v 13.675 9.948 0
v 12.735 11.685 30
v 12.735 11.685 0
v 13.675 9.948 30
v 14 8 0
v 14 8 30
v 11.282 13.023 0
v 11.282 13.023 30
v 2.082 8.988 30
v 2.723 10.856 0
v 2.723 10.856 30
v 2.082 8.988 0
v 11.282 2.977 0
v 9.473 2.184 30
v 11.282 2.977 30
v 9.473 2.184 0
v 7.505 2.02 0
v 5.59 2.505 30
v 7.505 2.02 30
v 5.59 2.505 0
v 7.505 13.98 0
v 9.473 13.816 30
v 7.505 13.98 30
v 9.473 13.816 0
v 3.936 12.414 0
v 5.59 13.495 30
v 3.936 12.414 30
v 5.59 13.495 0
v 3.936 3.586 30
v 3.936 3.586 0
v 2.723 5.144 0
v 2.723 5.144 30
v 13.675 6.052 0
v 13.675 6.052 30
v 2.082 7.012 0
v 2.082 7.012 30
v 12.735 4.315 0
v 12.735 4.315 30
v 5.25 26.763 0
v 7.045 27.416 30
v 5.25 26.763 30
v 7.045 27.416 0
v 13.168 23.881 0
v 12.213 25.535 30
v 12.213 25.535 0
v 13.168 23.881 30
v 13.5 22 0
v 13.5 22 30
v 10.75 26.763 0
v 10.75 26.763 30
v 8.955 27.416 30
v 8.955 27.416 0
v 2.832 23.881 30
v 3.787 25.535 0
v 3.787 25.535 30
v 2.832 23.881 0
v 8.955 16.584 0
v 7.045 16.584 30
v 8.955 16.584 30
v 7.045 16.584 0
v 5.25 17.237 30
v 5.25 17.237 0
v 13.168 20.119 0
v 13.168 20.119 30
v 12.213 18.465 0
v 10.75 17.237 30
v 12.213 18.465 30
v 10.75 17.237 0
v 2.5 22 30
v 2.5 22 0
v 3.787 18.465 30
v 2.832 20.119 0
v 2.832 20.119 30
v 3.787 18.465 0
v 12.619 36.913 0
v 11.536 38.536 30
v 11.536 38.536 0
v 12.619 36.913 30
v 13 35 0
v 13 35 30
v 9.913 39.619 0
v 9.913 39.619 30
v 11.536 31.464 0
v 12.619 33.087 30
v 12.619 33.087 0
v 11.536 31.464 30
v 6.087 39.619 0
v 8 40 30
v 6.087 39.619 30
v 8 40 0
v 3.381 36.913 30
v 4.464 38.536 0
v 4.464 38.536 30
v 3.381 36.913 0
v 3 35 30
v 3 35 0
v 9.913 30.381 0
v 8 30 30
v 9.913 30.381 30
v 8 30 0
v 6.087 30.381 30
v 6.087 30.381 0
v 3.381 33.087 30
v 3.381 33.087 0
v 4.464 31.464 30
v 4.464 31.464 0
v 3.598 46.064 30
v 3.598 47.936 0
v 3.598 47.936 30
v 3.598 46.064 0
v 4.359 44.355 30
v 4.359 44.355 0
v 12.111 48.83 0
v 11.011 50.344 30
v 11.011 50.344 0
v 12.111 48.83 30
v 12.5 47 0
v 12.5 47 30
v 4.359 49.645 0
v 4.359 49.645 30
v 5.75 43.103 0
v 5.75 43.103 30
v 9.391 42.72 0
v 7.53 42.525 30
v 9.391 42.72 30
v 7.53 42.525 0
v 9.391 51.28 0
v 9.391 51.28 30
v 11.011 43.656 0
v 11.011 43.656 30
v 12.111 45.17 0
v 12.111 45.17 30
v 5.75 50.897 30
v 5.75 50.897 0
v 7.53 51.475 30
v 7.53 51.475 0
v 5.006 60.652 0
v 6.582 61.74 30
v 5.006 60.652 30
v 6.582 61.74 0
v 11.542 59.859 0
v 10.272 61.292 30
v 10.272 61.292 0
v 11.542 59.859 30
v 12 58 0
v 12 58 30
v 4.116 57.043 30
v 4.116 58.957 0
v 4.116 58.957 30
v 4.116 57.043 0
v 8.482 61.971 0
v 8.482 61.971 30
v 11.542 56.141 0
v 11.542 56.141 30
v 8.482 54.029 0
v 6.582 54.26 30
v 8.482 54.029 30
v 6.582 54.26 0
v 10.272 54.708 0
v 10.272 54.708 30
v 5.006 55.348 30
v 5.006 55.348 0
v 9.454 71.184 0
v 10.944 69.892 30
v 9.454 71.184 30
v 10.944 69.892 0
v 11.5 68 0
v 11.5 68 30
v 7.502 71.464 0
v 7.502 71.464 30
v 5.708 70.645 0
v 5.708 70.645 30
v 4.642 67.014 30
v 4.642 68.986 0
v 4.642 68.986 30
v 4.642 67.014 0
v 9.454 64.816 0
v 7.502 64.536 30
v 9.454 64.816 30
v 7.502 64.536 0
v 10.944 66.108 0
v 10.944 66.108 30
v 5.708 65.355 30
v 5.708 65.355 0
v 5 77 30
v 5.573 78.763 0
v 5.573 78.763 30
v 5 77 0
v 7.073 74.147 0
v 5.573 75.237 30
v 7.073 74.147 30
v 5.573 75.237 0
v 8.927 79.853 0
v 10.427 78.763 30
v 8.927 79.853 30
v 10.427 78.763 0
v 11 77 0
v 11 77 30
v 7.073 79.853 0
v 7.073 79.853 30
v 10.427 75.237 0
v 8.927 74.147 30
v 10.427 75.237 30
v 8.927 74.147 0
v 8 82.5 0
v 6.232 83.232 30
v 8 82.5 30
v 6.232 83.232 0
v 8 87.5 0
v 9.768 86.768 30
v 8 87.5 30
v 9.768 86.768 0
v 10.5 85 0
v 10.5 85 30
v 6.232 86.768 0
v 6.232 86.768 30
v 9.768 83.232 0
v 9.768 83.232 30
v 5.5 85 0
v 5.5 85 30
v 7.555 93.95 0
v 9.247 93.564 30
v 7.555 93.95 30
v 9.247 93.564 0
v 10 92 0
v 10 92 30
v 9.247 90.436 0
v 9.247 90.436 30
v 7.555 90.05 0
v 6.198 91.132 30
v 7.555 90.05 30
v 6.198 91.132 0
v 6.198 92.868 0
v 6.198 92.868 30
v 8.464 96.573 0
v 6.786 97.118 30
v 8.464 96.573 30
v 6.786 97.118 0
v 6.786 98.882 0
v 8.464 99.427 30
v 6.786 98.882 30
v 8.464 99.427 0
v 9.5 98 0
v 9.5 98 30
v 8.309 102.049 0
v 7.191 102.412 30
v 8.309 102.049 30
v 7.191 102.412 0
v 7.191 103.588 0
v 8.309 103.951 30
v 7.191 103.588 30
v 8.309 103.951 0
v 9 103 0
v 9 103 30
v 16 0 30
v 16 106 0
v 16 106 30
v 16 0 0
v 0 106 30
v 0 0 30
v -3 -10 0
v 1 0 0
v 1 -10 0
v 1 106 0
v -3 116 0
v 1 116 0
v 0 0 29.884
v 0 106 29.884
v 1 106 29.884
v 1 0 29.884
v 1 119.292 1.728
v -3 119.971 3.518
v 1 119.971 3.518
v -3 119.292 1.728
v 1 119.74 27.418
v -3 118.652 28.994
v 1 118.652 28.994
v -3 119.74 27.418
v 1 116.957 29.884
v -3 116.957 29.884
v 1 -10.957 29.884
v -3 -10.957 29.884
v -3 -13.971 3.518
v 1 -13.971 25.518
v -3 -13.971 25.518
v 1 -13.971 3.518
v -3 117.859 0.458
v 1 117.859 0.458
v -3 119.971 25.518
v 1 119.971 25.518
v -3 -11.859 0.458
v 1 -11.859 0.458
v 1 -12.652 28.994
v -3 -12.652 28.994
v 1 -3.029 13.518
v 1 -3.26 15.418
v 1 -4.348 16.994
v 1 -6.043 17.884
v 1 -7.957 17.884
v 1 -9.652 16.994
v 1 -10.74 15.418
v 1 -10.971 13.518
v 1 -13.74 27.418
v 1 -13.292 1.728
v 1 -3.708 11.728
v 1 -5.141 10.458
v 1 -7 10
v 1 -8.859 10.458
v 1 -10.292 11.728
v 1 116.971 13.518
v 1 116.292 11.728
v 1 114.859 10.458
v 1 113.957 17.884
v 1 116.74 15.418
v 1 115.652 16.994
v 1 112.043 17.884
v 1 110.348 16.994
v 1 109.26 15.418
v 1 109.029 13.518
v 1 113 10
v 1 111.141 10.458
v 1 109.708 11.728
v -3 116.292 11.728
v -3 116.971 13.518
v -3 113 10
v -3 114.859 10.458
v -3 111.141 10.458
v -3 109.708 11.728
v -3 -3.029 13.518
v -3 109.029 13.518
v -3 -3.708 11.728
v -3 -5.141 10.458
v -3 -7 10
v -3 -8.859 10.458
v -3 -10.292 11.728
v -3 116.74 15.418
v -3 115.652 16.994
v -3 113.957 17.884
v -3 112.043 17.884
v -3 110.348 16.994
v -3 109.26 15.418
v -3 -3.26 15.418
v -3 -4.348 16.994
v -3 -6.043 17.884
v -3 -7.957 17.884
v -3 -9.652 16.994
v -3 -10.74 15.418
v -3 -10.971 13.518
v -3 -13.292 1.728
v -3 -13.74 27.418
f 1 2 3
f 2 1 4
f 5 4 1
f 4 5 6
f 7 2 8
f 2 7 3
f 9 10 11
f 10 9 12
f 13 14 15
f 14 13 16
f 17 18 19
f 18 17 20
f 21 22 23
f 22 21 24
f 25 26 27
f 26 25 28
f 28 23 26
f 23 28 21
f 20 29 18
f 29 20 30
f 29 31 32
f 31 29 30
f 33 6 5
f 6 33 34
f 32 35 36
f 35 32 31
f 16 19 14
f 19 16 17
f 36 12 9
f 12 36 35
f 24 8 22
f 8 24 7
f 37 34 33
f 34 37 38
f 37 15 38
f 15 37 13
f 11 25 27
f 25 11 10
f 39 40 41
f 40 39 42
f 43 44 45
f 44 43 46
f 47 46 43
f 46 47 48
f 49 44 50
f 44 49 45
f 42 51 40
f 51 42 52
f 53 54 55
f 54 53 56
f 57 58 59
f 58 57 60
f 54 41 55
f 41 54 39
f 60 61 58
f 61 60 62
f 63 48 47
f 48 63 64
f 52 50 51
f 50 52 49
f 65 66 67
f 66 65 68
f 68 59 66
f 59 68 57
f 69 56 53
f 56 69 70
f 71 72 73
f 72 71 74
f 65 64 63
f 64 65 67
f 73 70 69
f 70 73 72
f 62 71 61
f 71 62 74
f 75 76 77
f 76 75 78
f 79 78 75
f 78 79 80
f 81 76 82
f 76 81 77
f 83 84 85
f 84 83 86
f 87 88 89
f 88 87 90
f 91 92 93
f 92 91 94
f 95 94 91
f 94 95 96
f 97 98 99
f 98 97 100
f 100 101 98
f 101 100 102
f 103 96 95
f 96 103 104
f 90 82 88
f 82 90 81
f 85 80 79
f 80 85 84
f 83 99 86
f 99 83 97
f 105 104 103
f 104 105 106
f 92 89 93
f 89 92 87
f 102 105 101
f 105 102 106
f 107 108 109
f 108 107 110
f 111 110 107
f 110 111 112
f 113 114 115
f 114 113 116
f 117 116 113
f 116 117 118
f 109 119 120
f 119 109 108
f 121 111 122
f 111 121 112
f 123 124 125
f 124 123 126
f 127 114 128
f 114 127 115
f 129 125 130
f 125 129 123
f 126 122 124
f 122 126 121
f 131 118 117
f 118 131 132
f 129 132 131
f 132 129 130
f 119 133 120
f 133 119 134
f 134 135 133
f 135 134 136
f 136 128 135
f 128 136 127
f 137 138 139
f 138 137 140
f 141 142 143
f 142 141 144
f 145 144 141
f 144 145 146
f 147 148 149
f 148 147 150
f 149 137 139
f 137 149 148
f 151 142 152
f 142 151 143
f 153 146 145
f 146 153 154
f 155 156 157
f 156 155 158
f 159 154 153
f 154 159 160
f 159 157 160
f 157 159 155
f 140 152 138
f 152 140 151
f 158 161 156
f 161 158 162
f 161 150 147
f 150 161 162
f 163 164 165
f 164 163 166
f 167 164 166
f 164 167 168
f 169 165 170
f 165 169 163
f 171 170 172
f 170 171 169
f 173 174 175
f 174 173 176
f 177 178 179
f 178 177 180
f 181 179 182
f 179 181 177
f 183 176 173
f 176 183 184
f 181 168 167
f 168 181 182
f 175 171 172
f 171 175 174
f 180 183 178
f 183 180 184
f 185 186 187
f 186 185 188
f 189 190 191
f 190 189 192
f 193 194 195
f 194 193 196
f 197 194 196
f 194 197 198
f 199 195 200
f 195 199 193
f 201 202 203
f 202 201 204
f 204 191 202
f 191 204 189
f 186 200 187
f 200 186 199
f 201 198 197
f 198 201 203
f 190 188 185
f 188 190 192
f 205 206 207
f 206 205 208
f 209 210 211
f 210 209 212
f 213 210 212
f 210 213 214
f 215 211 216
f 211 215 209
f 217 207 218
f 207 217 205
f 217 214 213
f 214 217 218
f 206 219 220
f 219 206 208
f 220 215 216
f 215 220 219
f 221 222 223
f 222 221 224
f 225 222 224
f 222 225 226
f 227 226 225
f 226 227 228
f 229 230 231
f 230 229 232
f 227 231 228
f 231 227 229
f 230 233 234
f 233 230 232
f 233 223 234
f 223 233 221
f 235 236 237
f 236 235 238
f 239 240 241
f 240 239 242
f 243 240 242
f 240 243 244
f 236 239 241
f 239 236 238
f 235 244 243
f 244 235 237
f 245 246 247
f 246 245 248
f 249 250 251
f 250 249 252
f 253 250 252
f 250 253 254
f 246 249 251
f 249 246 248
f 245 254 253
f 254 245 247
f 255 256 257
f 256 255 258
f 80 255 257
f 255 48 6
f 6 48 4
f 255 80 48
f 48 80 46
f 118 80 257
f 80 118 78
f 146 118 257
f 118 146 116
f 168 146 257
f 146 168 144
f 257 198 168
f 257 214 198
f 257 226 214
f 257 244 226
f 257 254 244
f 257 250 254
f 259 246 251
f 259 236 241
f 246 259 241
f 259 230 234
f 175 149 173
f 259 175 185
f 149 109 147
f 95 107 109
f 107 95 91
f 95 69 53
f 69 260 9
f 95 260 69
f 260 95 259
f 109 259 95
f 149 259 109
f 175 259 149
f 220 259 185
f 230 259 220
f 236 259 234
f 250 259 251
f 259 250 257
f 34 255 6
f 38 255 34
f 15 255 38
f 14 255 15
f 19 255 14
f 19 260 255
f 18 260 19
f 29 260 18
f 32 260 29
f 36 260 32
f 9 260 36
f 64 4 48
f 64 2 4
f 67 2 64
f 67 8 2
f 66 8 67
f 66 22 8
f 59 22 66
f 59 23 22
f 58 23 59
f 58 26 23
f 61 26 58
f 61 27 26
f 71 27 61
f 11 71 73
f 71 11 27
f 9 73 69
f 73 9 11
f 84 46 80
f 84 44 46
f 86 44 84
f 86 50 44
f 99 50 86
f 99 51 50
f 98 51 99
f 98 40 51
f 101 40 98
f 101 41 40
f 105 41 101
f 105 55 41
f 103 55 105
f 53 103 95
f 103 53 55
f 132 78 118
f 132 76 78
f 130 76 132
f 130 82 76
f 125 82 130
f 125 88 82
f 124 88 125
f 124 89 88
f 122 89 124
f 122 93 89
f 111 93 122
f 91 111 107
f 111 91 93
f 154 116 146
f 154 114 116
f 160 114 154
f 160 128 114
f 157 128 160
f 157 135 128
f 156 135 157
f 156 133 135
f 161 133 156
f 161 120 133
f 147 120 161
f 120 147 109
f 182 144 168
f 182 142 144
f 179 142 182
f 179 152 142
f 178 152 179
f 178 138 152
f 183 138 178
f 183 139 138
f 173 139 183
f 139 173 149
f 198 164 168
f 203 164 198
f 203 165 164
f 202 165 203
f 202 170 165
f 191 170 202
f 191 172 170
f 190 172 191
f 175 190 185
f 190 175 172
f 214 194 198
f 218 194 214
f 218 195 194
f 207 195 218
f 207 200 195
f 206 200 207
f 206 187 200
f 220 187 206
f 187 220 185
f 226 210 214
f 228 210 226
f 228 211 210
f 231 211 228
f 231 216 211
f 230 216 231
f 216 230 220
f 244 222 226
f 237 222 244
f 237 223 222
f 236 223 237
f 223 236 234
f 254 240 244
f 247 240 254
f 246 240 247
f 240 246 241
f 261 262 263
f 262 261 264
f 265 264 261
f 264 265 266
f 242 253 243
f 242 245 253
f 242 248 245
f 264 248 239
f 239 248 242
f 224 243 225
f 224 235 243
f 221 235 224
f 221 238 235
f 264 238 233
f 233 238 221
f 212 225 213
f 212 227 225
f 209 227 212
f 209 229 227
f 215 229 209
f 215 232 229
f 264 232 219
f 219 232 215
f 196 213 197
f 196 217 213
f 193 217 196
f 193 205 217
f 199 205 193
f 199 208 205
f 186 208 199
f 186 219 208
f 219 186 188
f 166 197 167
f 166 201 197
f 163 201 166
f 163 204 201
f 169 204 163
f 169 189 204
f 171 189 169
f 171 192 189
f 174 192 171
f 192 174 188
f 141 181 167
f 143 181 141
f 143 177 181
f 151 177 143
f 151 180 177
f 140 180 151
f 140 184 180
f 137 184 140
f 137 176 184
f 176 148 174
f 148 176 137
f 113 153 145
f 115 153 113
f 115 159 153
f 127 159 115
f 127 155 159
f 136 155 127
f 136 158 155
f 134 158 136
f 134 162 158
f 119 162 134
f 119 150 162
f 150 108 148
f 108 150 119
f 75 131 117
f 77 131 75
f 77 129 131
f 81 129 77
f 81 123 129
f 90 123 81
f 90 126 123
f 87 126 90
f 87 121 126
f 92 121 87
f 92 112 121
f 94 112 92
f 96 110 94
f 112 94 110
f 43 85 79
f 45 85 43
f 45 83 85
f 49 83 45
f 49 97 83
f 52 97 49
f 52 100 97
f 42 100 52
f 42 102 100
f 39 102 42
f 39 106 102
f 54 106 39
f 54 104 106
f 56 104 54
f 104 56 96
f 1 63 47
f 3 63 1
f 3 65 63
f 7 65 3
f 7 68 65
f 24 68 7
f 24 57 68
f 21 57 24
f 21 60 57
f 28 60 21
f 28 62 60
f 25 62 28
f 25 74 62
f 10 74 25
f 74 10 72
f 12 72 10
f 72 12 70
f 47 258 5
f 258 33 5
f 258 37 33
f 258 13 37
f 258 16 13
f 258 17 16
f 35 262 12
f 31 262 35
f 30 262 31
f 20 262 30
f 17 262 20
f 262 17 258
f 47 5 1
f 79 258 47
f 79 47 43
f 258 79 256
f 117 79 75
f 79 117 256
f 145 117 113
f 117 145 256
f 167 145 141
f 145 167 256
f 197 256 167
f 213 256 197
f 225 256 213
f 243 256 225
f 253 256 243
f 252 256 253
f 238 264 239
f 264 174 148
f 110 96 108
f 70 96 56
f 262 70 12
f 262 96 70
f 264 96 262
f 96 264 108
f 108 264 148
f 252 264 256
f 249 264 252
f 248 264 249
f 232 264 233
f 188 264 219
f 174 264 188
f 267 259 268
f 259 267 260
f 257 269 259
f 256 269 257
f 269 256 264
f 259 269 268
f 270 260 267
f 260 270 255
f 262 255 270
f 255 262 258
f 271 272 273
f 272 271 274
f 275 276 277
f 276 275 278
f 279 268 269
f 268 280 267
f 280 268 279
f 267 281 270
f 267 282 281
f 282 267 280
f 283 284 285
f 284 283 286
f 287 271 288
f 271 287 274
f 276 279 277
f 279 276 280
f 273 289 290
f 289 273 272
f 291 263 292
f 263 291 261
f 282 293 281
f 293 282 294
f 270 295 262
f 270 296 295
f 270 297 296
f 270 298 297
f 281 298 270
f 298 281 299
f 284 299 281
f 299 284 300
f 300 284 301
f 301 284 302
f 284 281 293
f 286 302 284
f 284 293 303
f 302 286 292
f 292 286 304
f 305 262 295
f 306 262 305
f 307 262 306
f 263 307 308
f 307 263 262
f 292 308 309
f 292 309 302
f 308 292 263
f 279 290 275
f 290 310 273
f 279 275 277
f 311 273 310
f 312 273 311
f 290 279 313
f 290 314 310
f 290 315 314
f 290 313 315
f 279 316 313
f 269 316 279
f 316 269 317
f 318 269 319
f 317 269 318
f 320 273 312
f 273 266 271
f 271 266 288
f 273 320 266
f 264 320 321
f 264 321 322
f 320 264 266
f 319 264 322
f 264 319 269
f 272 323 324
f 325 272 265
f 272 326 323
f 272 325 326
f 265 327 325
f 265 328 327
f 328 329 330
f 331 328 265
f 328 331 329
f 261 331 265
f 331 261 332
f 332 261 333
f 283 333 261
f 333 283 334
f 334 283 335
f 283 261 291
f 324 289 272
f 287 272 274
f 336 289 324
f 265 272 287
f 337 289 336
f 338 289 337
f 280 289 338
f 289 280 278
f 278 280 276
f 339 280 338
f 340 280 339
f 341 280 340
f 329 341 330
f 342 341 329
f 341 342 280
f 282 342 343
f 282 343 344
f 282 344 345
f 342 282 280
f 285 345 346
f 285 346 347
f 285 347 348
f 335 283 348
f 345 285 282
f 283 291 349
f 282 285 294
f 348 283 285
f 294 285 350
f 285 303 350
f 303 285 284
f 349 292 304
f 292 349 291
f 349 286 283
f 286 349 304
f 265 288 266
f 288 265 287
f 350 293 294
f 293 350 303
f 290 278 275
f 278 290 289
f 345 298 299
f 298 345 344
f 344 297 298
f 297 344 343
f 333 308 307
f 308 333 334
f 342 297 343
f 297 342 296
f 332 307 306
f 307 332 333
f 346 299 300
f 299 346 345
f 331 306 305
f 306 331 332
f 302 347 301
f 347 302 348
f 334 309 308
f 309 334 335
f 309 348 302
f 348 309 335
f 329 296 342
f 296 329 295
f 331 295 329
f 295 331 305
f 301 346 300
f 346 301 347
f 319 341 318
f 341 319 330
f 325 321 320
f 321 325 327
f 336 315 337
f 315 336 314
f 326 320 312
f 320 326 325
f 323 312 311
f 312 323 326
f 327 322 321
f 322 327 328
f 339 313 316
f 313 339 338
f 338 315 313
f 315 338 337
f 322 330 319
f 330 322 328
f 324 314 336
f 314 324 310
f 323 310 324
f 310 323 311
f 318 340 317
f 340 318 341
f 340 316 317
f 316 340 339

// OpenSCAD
/**
 * This work is licensed under a <a rel="license" href="https://creativecommons.org/licenses/by-sa/4.0/">Creative Commons Attribution 4.0 Unported License</a>.
 * You can find this on thingiverse: http://www.thingiverse.com/thing:1678352
 */

trous = [12, 11, 10, 9, 8, 7, 6, 5, 4, 3];
pos = [8, 22, 35, 47, 58, 68, 77, 85, 92, 98, 103];

union() {
    difference() {
        cube([16,pos[len(pos)-1]+trous[len(trous)-1],30]);
        for(i = [0:len(pos)-1]) {
            translate([8,pos[i],-10]) {
                cylinder(h = 50, r=(trous[i]/2.0));
            }
        }
    }
    translate([-3, -10, 4]) {
        difference() {
            minkowski() {
                rotate([0, 90, 0]) {
                    cylinder(h = 2, r = 4);
                }
                cube([2, pos[len(pos)-1]+trous[len(trous)-1]+20, 22]);
            }
            translate([-1, 3, 10]) {
                rotate([0, 90, 0]) {
                    cylinder(h = 6, r = 4);
                }
            }
            translate([-1, pos[len(pos)-1]+20, 10]) {
                rotate([0, 90, 0]) {
                    cylinder(h = 6, r = 4);
                }
            }
        }
    }
}
